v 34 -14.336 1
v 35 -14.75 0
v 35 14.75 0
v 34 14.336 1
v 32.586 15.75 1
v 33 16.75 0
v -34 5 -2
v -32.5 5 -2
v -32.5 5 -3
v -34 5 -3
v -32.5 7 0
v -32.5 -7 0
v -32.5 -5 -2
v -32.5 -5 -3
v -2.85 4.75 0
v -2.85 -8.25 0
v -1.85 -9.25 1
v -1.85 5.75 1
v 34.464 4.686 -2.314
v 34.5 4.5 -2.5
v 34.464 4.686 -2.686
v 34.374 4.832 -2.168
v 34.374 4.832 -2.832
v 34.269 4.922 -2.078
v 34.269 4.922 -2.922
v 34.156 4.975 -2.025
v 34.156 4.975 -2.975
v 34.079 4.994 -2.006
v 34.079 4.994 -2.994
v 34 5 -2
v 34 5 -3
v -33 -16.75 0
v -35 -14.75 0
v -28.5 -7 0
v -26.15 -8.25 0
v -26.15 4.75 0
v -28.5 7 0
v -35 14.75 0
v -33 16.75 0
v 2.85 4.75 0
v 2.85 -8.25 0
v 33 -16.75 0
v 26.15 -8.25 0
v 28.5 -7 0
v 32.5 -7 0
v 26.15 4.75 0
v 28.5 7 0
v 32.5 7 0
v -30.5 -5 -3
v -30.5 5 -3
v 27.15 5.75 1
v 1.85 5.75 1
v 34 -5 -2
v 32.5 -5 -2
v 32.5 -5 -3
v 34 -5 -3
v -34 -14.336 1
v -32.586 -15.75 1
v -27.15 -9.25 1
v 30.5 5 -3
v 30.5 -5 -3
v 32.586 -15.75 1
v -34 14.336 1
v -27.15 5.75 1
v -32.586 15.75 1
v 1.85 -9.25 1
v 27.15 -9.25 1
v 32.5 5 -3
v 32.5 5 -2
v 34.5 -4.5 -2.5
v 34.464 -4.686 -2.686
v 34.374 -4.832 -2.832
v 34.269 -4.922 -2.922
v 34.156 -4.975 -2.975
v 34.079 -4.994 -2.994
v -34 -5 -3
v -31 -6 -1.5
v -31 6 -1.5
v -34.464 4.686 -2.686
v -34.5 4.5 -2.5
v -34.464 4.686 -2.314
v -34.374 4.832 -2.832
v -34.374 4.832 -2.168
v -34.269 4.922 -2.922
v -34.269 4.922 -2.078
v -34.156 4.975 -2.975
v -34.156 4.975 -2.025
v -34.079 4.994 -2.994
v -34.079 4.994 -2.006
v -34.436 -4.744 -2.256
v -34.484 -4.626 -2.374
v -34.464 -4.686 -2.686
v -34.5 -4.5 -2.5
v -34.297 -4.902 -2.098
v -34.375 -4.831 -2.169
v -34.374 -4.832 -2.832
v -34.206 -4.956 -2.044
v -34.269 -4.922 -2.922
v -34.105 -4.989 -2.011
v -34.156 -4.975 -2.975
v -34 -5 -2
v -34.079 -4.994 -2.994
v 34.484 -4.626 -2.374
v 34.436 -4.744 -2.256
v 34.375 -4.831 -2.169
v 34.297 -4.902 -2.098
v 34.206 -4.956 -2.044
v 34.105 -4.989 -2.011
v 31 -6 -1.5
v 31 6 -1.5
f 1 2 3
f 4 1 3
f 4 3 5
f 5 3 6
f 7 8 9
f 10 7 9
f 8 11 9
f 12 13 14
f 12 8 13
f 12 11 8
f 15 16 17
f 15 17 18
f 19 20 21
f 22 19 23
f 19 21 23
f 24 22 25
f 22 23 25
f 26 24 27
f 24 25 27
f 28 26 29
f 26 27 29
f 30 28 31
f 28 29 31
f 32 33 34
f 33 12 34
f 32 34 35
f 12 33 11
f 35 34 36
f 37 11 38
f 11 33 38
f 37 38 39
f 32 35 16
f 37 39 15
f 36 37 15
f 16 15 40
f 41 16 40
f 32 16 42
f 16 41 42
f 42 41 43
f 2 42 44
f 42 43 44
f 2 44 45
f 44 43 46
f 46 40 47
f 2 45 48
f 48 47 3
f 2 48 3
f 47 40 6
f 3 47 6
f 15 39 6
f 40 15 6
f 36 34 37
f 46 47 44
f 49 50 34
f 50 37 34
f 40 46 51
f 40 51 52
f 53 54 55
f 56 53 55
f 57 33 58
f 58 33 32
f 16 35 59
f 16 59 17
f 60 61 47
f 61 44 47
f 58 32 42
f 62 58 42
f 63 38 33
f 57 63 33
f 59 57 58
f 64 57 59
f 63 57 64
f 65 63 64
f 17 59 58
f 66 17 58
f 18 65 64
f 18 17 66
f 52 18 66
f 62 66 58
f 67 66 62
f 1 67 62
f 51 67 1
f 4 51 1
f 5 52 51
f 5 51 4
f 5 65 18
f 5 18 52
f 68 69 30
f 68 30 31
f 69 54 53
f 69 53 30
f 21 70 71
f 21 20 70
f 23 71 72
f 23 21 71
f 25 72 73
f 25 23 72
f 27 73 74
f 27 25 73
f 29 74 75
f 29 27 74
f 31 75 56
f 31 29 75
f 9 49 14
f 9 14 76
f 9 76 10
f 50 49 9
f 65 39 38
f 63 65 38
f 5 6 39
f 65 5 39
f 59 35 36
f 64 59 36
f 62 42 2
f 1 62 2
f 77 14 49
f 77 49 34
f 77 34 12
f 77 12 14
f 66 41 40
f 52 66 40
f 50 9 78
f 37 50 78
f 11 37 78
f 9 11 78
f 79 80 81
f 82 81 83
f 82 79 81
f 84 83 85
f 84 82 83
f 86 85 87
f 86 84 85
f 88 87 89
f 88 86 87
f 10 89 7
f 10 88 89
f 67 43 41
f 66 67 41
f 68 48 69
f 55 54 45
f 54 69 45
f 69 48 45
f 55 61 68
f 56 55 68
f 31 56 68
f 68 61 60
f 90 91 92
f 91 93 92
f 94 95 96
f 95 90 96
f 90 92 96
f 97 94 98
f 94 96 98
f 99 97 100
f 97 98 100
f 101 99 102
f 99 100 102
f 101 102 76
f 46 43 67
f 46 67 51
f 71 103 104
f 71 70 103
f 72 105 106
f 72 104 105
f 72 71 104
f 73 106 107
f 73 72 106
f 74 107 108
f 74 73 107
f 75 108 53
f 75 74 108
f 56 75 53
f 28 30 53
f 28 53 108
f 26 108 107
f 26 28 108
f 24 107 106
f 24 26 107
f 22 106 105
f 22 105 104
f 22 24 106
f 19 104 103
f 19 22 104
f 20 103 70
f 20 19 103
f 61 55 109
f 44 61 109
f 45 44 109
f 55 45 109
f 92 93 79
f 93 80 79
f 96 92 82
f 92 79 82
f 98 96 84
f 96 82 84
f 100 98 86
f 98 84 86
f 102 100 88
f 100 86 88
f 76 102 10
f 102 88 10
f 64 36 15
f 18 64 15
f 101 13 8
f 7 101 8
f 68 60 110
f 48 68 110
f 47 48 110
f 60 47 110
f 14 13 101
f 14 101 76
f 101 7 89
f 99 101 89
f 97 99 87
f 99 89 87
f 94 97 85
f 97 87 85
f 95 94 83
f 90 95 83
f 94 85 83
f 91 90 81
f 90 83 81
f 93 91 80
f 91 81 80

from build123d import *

# Parameters (mm, degrees)
BOSS_EXTRUDE1_DEPTH      = 1
SKETCH2_W                = 23.3
SKETCH2_H                = 13
CUT_EXTRUDE1_DEPTH       = 3
CHAMFER1_SIZE            = 1
CHAMFER1_OF_MIRROR1_SIZE = 1
CHAMFER2_SIZE            = 1
SKETCH3_W                = 2
SKETCH3_H                = 10
BOSS_EXTRUDE2_DEPTH      = 3
SKETCH4_W                = 1
SKETCH4_H                = 10
BOSS_EXTRUDE3_DEPTH      = 2
FILLET1_R                = 0.5
FILLET1_OF_MIRROR2_R     = 0.5


with BuildPart() as part:
    # Sketch1 → Boss-Extrude1 (new body)
    with BuildSketch(Plane.XY):
        Polygon((-35, 14.75), (-35, -14.75), (-33, -16.75), (33, -16.75), (35, -14.75), (35, 14.75), (33, 16.75), (-33, 16.75), align=None)
    extrude(amount=BOSS_EXTRUDE1_DEPTH)

    # Sketch2 → Cut-Extrude1 (cut)
    with BuildSketch(Plane.XY.offset(1)):
        with Locations((-14.5, -1.75)):
            Rectangle(SKETCH2_W, SKETCH2_H)
    cut_extrude1 = extrude(amount=-CUT_EXTRUDE1_DEPTH, mode=Mode.SUBTRACT)

    # Chamfer1
    chamfer1_edges = [part.edges().sort_by_distance(p)[0] for p in [
        (-14.5, -8.25, 1),
        (-2.85, -1.75, 1),
        (-14.5, 4.75, 1),
        (-26.15, -1.75, 1),
    ]]
    chamfer(chamfer1_edges, length=CHAMFER1_SIZE - 0.0001)  # a hair under: the kernel refuses the full size

    # Mirror1: Cut-Extrude1 across plane
    add(cut_extrude1.mirror(Plane(origin=(0, 0, 0), x_dir=(0, 0, 1), z_dir=(1, 0, 0))), mode=Mode.SUBTRACT)

    # Chamfer1 of Mirror1
    chamfer1_of_mirror1_edges = [part.edges().sort_by_distance(p)[0] for p in [
        (14.5, -8.25, 1),
        (2.85, -1.75, 1),
        (14.5, 4.75, 1),
        (26.15, -1.75, 1),
    ]]
    chamfer(chamfer1_of_mirror1_edges, length=CHAMFER1_OF_MIRROR1_SIZE - 0.0001)  # a hair under: the kernel refuses the full size

    # Chamfer2
    chamfer2_edges = [part.edges().sort_by_distance(p)[0] for p in [
        (35, 0, 1),
        (34, 15.75, 1),
        (0, 16.75, 1),
        (-34, 15.75, 1),
        (-35, 0, 1),
        (34, -15.75, 1),
        (0, -16.75, 1),
        (-34, -15.75, 1),
    ]]
    chamfer(chamfer2_edges, length=CHAMFER2_SIZE - 0.0001)  # a hair under: the kernel refuses the full size

    # Sketch3 → Boss-Extrude2 (add)
    with BuildSketch(Plane(origin=(0, 0, 0), x_dir=(-1, 0, 0), z_dir=(0, 0, -1))):
        with Locations((-31.5, 0)):
            Rectangle(SKETCH3_W, SKETCH3_H)
    boss_extrude2 = extrude(amount=BOSS_EXTRUDE2_DEPTH)

    # Sketch4 → Boss-Extrude3 (add)
    with BuildSketch(Plane(origin=(32.5, 0, 0), x_dir=(0, 0, -1), z_dir=(1, 0, 0))):
        with Locations((2.5, 0)):
            Rectangle(SKETCH4_W, SKETCH4_H)
    boss_extrude3 = extrude(amount=BOSS_EXTRUDE3_DEPTH)

    # Fillet1
    fillet1_edges = [part.edges().sort_by_distance(p)[0] for p in [
        (34.5, 0, -3),
        (34.5, 5, -2.5),
        (34.5, 0, -2),
        (34.5, -5, -2.5),
    ]]
    fillet(fillet1_edges, radius=FILLET1_R - 0.0001)  # a hair under: the kernel refuses the full size

    # Mirror2: Boss-Extrude2, Boss-Extrude3 across plane
    add(boss_extrude2.mirror(Plane(origin=(0, 0, 0), x_dir=(0, 0, 1), z_dir=(1, 0, 0))))
    add(boss_extrude3.mirror(Plane(origin=(0, 0, 0), x_dir=(0, 0, 1), z_dir=(1, 0, 0))))

    # Fillet1 of Mirror2
    fillet1_of_mirror2_edges = [part.edges().sort_by_distance(p)[0] for p in [
        (-34.5, 0, -3),
        (-34.5, 5, -2.5),
        (-34.5, 0, -2),
        (-34.5, -5, -2.5),
    ]]
    fillet(fillet1_of_mirror2_edges, radius=FILLET1_OF_MIRROR2_R - 0.0001)  # a hair under: the kernel refuses the full size

    # Chamfer3: read off the stored shape, not the designer's step
    # Chamfer3: loft between two sections, ruled curve by curve
    chamfer3_from = [
        Edge.make_line((32.5, -5, -3), (30.5, -5, -3)),
        Edge.make_line((30.5, -5, -3), (30.5, 5, -3)),
        Edge.make_line((30.5, 5, -3), (32.5, 5, -3)),
        Edge.make_line((32.5, 5, -3), (32.5, -5, -3)),
    ]
    chamfer3_to = [
        Edge.make_line((32.5, -7, 0), (28.5, -7, 0)),
        Edge.make_line((28.5, -7, 0), (28.5, 7, 0)),
        Edge.make_line((28.5, 7, 0), (32.5, 7, 0)),
        Edge.make_line((32.5, 7, 0), (32.5, -7, 0)),
    ]
    chamfer3 = Solid(Shell([*[Face.make_surface_from_curves(chamfer3_from[k], chamfer3_to[k]) for k in range(4)], Face(Wire(chamfer3_from)), Face(Wire(chamfer3_to))]))
    add(chamfer3)

    # Chamfer4: read off the stored shape, not the designer's step
    # Chamfer4: loft between two sections, ruled curve by curve
    chamfer4_from = [
        Edge.make_line((-32.5, -5, -3), (-30.5, -5, -3)),
        Edge.make_line((-32.5, 5, -3), (-30.5, 5, -3)),
        Edge.make_line((-30.5, 5, -3), (-30.5, -5, -3)),
        Edge.make_line((-32.5, 5, -3), (-32.5, -5, -3)),
    ]
    chamfer4_to = [
        Edge.make_line((-32.5, -7, 0), (-28.5, -7, 0)),
        Edge.make_line((-32.5, 7, 0), (-28.5, 7, 0)),
        Edge.make_line((-28.5, 7, 0), (-28.5, -7, 0)),
        Edge.make_line((-32.5, 7, 0), (-32.5, -7, 0)),
    ]
    chamfer4 = Solid(Shell([*[Face.make_surface_from_curves(chamfer4_from[k], chamfer4_to[k]) for k in range(4)], Face(Wire(chamfer4_from)), Face(Wire(chamfer4_to))]))
    add(chamfer4)


solid = part.part
